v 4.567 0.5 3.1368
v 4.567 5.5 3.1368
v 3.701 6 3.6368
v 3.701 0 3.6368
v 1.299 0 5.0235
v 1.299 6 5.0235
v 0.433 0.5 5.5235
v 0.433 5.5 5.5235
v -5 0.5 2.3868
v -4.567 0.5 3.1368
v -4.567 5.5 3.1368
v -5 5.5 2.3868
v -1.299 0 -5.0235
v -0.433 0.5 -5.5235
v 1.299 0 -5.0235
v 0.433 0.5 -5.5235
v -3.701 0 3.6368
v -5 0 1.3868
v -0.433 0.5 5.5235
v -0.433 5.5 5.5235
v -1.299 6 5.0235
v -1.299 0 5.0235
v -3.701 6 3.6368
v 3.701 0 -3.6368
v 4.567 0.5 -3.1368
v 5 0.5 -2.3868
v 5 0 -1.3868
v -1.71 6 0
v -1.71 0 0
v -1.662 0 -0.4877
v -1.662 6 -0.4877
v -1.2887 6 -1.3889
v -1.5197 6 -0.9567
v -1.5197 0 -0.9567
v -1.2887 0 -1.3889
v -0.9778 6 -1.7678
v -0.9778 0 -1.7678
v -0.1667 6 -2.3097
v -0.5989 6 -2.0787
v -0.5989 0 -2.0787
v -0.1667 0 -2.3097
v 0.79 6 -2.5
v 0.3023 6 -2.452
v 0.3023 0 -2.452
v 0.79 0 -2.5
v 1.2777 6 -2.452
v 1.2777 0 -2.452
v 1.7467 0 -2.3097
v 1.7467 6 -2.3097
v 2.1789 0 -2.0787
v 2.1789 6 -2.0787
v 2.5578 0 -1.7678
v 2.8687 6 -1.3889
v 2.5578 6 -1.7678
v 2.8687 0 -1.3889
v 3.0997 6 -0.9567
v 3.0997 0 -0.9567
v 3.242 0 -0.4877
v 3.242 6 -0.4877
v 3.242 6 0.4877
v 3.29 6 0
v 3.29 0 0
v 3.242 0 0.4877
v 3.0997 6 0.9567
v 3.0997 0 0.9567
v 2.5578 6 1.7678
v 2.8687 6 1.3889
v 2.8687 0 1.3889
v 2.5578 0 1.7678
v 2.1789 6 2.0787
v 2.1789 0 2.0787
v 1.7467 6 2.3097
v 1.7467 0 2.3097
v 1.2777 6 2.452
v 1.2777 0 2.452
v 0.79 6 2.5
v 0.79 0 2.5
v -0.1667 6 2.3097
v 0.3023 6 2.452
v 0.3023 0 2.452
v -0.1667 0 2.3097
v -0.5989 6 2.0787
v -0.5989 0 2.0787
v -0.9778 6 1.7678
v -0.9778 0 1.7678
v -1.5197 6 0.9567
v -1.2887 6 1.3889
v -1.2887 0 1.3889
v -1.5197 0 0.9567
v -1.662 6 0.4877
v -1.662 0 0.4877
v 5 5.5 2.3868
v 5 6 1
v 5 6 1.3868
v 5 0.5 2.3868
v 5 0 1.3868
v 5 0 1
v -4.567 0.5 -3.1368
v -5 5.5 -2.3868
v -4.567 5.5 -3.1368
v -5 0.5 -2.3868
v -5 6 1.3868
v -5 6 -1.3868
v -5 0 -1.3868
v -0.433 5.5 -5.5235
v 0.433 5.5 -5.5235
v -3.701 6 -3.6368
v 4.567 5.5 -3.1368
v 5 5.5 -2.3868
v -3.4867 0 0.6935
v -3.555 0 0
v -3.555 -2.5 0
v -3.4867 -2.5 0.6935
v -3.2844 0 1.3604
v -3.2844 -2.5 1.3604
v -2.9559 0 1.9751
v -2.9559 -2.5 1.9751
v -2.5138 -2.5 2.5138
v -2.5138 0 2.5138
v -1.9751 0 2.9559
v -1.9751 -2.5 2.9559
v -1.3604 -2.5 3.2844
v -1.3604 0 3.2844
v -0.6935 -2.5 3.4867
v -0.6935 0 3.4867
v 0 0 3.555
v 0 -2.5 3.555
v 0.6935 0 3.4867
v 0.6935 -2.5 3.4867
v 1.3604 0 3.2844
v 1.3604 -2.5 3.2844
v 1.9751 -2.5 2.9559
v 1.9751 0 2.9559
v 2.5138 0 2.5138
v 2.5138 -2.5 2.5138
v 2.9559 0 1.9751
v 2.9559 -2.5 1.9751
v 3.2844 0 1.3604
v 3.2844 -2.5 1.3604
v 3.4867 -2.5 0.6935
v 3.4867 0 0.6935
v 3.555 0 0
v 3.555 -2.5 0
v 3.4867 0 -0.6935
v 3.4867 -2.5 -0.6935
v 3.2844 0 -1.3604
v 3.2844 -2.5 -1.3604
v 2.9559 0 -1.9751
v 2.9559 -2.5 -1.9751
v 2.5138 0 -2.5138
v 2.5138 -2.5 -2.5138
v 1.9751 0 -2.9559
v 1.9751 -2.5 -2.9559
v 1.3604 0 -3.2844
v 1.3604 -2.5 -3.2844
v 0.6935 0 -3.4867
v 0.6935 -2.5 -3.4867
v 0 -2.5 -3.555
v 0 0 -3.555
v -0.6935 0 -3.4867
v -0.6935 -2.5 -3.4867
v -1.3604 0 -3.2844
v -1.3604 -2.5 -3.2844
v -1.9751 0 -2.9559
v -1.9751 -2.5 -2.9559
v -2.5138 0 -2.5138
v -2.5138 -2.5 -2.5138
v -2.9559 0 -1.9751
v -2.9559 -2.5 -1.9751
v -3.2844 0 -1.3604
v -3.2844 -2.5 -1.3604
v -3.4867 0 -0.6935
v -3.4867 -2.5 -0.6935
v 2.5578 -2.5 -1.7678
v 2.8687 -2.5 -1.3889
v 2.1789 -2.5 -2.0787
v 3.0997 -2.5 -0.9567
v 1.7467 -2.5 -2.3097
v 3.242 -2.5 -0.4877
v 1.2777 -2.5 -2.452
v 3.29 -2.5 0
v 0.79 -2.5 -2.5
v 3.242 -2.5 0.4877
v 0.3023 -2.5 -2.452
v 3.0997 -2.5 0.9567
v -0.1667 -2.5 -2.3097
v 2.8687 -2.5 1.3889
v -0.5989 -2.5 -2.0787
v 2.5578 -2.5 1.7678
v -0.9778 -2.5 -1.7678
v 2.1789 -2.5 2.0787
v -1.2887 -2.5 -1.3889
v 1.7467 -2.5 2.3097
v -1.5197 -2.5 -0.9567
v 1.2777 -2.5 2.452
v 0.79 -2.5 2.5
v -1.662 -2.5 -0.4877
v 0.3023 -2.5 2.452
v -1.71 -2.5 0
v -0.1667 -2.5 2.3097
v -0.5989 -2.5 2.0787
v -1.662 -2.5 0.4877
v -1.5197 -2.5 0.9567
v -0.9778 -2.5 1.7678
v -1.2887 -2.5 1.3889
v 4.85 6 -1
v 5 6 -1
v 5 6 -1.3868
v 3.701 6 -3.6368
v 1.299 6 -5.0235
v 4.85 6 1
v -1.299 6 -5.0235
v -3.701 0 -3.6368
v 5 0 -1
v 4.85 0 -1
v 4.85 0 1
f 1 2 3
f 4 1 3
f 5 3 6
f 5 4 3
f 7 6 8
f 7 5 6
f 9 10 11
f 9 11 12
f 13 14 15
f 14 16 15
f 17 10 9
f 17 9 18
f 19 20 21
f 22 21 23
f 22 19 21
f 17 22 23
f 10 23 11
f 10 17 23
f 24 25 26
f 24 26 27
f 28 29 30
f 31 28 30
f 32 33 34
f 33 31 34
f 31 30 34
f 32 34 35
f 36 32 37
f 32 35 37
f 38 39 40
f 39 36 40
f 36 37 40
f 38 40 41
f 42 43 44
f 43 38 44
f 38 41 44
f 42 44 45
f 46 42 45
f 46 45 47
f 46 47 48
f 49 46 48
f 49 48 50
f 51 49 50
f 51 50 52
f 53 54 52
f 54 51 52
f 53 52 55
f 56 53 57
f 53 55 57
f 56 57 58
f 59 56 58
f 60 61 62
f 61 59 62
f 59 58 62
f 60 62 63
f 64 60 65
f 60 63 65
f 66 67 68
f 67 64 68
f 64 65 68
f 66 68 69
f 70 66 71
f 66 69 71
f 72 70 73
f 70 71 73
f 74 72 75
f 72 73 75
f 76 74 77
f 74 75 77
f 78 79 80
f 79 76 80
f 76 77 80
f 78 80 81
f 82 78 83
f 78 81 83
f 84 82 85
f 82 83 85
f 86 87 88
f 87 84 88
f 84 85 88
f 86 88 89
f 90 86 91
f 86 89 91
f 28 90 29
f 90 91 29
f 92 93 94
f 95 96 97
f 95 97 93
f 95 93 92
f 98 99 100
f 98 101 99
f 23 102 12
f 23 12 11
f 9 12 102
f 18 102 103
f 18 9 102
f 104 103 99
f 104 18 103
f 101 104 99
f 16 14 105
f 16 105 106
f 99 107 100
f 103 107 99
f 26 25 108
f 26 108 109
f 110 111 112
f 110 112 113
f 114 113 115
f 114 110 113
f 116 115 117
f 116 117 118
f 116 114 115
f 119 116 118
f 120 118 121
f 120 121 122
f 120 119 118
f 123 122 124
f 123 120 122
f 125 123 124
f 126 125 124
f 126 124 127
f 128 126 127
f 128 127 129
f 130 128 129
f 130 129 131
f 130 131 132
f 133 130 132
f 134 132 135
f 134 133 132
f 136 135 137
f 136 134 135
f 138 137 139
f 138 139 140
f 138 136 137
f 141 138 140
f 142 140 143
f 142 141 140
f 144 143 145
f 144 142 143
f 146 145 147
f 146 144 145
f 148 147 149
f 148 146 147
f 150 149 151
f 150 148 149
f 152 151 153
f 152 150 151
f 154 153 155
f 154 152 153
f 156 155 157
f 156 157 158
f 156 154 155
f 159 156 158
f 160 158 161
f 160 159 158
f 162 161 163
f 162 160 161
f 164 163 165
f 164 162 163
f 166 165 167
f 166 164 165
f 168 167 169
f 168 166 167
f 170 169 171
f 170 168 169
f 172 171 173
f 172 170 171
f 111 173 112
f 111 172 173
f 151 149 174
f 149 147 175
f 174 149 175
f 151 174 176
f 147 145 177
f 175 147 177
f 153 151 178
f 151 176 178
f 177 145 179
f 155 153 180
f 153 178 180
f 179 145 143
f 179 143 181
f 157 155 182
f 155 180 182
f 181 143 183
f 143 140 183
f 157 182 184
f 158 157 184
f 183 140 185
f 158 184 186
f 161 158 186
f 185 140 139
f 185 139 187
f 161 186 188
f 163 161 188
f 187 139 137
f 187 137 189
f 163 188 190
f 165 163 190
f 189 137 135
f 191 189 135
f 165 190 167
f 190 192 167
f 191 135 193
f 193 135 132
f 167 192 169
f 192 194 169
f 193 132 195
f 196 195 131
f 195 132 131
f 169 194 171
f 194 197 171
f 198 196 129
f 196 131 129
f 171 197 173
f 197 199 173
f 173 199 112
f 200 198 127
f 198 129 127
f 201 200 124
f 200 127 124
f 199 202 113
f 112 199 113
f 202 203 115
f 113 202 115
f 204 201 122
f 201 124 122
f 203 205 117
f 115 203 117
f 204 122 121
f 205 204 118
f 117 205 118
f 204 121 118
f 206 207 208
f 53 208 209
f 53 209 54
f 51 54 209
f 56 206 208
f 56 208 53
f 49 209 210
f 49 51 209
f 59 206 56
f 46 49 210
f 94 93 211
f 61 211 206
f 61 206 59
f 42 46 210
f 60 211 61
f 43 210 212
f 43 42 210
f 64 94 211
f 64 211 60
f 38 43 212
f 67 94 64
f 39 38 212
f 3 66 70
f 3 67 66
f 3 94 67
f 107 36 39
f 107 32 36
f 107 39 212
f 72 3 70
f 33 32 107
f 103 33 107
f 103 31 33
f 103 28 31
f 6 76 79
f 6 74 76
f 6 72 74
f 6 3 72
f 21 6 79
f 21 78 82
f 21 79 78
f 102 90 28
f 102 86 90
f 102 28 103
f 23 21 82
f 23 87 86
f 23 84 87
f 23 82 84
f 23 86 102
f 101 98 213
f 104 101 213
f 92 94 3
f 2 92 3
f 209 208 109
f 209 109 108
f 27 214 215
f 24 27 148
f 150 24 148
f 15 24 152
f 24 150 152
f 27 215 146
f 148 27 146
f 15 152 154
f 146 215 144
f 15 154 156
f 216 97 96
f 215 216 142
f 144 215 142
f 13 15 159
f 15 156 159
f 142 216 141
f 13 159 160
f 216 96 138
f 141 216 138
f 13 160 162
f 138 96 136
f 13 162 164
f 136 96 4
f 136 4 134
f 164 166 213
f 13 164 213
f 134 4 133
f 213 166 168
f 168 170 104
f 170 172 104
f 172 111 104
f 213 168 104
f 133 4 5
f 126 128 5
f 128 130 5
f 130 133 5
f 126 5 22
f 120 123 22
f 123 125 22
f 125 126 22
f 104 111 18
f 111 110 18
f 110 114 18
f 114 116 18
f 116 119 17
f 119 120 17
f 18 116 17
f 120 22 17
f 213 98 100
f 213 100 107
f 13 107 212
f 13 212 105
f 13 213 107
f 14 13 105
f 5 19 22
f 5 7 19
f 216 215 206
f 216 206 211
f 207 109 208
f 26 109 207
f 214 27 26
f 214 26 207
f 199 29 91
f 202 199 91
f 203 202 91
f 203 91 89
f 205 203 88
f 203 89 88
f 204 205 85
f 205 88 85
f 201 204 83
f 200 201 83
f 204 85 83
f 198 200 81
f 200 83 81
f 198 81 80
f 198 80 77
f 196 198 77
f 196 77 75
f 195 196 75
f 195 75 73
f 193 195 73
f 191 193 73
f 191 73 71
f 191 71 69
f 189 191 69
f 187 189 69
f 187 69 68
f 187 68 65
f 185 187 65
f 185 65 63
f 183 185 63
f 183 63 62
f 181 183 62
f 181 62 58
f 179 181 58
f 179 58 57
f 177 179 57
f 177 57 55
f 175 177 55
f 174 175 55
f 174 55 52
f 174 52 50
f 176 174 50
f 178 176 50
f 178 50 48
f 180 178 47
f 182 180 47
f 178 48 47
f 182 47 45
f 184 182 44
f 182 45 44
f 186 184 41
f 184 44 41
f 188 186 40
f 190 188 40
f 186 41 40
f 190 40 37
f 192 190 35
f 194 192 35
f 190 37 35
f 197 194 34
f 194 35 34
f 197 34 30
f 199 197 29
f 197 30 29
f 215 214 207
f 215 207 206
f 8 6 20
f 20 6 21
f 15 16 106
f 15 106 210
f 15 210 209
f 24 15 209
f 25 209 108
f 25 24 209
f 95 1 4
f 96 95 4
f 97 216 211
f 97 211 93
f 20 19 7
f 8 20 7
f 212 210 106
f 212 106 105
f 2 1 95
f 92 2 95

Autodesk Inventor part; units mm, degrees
ref_plane "YZ Plane" through (0, 0, 0) normal (1, 0, 0) x (0, 1, 0)
ref_plane "XZ Plane" through (0, 0, 0) normal (0, 1, 0) x (-1, 0, 0)
ref_plane "XY Plane" through (0, 0, 0) normal (0, 0, 1) x (1, 0, 0)
sketch "Sketch1" plane through (0, 0, 0) normal (0, 1, 0) x (-1, 0, 0)
  line L0 (-4.567, 3.1368) -> (-0.433, 5.5235)
  line L1 (0.433, 5.5235) -> (4.567, 3.1368)
  line L2 (5, 2.3868) -> (5, -2.3868)
  line L3 (4.567, -3.1368) -> (0.433, -5.5235)
  line L4 (-0.433, -5.5235) -> (-4.567, -3.1368)
  circle A0 centre (0, 0) radius 3.555
  circle A1 centre (-0.79, 0) radius 2.5
  line L5 (0.433, 5.5235) -> (-0.433, 5.5235)
  line L6 (-4.567, 3.1368) -> (-5, 2.3868)
  line L7 (4.567, 3.1368) -> (5, 2.3868)
  line L8 (5, -2.3868) -> (4.567, -3.1368)
  line L9 (0.433, -5.5235) -> (-0.433, -5.5235)
  line L10 (-4.567, -3.1368) -> (-5, -2.3868)
  line L11 (-5, -1) -> (-4.85, -1)
  line L12 (-4.85, -1) -> (-4.85, 1)
  line L13 (-4.85, 1) -> (-5, 1)
  line L14 (-5, -2.3868) -> (-5, -1)
  line L15 (-5, 1) -> (-5, 2.3868)
  point P0 (-5, 2.8868)
  point P1 (0, 5.7735)
  point P2 (5, 2.8868)
  point P3 (5, -2.8868)
  point P4 (0, -5.7735)
  point P5 (-5, -2.8868)
  point P6 (-4.85, 0)
  dimension "d1" = 7.11
  dimension "d2" = 5
  dimension "d3" = 0.79
  dimension "d4" = 0.5
  dimension "d5" = 0.5
  dimension "d6" = 0.5
  dimension "d7" = 0.5
  dimension "d8" = 0.5
  dimension "d9" = 0.5
  dimension "d10" = 0.5
  dimension "d11" = 0.5
  dimension "d12" = 0.5
  dimension "d13" = 0.5
  dimension "d14" = 0.5
  dimension "d15" = 0.5
  dimension "d16" = 2
extrude "Extrusion1" add sketch "Sketch1" along normal blind 6 contours L0 L5 L1 L7 L2 L8 L3 L9 L4 L10 L14 L11 L12 L13 L15 L6 | A0
extrude "Extrusion2" add sketch "Sketch1" against normal blind 2.5 contours A0
chamfer "Chamfer1" distance 0.5 angle 45 12 edges at (-4.7835, 0, -2.7618) (0, 0, -5.5235) (-4.7835, 0, 2.7618) (4.7835, 0, -2.7618) (4.7835, 0, 2.7618) (0, 0, 5.5235) (4.7835, 6, 2.7618) (0, 6, 5.5235) (-4.7835, 6, 2.7618) (-4.7835, 6, -2.7618) (0, 6, -5.5235) (4.7835, 6, -2.7618)
equation "\"d5\" = d4"
equation "\"d6\" = d4"
equation "\"d7\" = d6"
equation "\"d8\" = d4"
equation "\"d9\" = d8"
equation "\"d10\" = d4"
equation "\"d11\" = d10"
equation "\"d12\" = d4"
equation "\"d13\" = d12"
equation "\"d14\" = d4"
equation "\"d15\" = d14"
properties part number "Eccentric Spacer"
